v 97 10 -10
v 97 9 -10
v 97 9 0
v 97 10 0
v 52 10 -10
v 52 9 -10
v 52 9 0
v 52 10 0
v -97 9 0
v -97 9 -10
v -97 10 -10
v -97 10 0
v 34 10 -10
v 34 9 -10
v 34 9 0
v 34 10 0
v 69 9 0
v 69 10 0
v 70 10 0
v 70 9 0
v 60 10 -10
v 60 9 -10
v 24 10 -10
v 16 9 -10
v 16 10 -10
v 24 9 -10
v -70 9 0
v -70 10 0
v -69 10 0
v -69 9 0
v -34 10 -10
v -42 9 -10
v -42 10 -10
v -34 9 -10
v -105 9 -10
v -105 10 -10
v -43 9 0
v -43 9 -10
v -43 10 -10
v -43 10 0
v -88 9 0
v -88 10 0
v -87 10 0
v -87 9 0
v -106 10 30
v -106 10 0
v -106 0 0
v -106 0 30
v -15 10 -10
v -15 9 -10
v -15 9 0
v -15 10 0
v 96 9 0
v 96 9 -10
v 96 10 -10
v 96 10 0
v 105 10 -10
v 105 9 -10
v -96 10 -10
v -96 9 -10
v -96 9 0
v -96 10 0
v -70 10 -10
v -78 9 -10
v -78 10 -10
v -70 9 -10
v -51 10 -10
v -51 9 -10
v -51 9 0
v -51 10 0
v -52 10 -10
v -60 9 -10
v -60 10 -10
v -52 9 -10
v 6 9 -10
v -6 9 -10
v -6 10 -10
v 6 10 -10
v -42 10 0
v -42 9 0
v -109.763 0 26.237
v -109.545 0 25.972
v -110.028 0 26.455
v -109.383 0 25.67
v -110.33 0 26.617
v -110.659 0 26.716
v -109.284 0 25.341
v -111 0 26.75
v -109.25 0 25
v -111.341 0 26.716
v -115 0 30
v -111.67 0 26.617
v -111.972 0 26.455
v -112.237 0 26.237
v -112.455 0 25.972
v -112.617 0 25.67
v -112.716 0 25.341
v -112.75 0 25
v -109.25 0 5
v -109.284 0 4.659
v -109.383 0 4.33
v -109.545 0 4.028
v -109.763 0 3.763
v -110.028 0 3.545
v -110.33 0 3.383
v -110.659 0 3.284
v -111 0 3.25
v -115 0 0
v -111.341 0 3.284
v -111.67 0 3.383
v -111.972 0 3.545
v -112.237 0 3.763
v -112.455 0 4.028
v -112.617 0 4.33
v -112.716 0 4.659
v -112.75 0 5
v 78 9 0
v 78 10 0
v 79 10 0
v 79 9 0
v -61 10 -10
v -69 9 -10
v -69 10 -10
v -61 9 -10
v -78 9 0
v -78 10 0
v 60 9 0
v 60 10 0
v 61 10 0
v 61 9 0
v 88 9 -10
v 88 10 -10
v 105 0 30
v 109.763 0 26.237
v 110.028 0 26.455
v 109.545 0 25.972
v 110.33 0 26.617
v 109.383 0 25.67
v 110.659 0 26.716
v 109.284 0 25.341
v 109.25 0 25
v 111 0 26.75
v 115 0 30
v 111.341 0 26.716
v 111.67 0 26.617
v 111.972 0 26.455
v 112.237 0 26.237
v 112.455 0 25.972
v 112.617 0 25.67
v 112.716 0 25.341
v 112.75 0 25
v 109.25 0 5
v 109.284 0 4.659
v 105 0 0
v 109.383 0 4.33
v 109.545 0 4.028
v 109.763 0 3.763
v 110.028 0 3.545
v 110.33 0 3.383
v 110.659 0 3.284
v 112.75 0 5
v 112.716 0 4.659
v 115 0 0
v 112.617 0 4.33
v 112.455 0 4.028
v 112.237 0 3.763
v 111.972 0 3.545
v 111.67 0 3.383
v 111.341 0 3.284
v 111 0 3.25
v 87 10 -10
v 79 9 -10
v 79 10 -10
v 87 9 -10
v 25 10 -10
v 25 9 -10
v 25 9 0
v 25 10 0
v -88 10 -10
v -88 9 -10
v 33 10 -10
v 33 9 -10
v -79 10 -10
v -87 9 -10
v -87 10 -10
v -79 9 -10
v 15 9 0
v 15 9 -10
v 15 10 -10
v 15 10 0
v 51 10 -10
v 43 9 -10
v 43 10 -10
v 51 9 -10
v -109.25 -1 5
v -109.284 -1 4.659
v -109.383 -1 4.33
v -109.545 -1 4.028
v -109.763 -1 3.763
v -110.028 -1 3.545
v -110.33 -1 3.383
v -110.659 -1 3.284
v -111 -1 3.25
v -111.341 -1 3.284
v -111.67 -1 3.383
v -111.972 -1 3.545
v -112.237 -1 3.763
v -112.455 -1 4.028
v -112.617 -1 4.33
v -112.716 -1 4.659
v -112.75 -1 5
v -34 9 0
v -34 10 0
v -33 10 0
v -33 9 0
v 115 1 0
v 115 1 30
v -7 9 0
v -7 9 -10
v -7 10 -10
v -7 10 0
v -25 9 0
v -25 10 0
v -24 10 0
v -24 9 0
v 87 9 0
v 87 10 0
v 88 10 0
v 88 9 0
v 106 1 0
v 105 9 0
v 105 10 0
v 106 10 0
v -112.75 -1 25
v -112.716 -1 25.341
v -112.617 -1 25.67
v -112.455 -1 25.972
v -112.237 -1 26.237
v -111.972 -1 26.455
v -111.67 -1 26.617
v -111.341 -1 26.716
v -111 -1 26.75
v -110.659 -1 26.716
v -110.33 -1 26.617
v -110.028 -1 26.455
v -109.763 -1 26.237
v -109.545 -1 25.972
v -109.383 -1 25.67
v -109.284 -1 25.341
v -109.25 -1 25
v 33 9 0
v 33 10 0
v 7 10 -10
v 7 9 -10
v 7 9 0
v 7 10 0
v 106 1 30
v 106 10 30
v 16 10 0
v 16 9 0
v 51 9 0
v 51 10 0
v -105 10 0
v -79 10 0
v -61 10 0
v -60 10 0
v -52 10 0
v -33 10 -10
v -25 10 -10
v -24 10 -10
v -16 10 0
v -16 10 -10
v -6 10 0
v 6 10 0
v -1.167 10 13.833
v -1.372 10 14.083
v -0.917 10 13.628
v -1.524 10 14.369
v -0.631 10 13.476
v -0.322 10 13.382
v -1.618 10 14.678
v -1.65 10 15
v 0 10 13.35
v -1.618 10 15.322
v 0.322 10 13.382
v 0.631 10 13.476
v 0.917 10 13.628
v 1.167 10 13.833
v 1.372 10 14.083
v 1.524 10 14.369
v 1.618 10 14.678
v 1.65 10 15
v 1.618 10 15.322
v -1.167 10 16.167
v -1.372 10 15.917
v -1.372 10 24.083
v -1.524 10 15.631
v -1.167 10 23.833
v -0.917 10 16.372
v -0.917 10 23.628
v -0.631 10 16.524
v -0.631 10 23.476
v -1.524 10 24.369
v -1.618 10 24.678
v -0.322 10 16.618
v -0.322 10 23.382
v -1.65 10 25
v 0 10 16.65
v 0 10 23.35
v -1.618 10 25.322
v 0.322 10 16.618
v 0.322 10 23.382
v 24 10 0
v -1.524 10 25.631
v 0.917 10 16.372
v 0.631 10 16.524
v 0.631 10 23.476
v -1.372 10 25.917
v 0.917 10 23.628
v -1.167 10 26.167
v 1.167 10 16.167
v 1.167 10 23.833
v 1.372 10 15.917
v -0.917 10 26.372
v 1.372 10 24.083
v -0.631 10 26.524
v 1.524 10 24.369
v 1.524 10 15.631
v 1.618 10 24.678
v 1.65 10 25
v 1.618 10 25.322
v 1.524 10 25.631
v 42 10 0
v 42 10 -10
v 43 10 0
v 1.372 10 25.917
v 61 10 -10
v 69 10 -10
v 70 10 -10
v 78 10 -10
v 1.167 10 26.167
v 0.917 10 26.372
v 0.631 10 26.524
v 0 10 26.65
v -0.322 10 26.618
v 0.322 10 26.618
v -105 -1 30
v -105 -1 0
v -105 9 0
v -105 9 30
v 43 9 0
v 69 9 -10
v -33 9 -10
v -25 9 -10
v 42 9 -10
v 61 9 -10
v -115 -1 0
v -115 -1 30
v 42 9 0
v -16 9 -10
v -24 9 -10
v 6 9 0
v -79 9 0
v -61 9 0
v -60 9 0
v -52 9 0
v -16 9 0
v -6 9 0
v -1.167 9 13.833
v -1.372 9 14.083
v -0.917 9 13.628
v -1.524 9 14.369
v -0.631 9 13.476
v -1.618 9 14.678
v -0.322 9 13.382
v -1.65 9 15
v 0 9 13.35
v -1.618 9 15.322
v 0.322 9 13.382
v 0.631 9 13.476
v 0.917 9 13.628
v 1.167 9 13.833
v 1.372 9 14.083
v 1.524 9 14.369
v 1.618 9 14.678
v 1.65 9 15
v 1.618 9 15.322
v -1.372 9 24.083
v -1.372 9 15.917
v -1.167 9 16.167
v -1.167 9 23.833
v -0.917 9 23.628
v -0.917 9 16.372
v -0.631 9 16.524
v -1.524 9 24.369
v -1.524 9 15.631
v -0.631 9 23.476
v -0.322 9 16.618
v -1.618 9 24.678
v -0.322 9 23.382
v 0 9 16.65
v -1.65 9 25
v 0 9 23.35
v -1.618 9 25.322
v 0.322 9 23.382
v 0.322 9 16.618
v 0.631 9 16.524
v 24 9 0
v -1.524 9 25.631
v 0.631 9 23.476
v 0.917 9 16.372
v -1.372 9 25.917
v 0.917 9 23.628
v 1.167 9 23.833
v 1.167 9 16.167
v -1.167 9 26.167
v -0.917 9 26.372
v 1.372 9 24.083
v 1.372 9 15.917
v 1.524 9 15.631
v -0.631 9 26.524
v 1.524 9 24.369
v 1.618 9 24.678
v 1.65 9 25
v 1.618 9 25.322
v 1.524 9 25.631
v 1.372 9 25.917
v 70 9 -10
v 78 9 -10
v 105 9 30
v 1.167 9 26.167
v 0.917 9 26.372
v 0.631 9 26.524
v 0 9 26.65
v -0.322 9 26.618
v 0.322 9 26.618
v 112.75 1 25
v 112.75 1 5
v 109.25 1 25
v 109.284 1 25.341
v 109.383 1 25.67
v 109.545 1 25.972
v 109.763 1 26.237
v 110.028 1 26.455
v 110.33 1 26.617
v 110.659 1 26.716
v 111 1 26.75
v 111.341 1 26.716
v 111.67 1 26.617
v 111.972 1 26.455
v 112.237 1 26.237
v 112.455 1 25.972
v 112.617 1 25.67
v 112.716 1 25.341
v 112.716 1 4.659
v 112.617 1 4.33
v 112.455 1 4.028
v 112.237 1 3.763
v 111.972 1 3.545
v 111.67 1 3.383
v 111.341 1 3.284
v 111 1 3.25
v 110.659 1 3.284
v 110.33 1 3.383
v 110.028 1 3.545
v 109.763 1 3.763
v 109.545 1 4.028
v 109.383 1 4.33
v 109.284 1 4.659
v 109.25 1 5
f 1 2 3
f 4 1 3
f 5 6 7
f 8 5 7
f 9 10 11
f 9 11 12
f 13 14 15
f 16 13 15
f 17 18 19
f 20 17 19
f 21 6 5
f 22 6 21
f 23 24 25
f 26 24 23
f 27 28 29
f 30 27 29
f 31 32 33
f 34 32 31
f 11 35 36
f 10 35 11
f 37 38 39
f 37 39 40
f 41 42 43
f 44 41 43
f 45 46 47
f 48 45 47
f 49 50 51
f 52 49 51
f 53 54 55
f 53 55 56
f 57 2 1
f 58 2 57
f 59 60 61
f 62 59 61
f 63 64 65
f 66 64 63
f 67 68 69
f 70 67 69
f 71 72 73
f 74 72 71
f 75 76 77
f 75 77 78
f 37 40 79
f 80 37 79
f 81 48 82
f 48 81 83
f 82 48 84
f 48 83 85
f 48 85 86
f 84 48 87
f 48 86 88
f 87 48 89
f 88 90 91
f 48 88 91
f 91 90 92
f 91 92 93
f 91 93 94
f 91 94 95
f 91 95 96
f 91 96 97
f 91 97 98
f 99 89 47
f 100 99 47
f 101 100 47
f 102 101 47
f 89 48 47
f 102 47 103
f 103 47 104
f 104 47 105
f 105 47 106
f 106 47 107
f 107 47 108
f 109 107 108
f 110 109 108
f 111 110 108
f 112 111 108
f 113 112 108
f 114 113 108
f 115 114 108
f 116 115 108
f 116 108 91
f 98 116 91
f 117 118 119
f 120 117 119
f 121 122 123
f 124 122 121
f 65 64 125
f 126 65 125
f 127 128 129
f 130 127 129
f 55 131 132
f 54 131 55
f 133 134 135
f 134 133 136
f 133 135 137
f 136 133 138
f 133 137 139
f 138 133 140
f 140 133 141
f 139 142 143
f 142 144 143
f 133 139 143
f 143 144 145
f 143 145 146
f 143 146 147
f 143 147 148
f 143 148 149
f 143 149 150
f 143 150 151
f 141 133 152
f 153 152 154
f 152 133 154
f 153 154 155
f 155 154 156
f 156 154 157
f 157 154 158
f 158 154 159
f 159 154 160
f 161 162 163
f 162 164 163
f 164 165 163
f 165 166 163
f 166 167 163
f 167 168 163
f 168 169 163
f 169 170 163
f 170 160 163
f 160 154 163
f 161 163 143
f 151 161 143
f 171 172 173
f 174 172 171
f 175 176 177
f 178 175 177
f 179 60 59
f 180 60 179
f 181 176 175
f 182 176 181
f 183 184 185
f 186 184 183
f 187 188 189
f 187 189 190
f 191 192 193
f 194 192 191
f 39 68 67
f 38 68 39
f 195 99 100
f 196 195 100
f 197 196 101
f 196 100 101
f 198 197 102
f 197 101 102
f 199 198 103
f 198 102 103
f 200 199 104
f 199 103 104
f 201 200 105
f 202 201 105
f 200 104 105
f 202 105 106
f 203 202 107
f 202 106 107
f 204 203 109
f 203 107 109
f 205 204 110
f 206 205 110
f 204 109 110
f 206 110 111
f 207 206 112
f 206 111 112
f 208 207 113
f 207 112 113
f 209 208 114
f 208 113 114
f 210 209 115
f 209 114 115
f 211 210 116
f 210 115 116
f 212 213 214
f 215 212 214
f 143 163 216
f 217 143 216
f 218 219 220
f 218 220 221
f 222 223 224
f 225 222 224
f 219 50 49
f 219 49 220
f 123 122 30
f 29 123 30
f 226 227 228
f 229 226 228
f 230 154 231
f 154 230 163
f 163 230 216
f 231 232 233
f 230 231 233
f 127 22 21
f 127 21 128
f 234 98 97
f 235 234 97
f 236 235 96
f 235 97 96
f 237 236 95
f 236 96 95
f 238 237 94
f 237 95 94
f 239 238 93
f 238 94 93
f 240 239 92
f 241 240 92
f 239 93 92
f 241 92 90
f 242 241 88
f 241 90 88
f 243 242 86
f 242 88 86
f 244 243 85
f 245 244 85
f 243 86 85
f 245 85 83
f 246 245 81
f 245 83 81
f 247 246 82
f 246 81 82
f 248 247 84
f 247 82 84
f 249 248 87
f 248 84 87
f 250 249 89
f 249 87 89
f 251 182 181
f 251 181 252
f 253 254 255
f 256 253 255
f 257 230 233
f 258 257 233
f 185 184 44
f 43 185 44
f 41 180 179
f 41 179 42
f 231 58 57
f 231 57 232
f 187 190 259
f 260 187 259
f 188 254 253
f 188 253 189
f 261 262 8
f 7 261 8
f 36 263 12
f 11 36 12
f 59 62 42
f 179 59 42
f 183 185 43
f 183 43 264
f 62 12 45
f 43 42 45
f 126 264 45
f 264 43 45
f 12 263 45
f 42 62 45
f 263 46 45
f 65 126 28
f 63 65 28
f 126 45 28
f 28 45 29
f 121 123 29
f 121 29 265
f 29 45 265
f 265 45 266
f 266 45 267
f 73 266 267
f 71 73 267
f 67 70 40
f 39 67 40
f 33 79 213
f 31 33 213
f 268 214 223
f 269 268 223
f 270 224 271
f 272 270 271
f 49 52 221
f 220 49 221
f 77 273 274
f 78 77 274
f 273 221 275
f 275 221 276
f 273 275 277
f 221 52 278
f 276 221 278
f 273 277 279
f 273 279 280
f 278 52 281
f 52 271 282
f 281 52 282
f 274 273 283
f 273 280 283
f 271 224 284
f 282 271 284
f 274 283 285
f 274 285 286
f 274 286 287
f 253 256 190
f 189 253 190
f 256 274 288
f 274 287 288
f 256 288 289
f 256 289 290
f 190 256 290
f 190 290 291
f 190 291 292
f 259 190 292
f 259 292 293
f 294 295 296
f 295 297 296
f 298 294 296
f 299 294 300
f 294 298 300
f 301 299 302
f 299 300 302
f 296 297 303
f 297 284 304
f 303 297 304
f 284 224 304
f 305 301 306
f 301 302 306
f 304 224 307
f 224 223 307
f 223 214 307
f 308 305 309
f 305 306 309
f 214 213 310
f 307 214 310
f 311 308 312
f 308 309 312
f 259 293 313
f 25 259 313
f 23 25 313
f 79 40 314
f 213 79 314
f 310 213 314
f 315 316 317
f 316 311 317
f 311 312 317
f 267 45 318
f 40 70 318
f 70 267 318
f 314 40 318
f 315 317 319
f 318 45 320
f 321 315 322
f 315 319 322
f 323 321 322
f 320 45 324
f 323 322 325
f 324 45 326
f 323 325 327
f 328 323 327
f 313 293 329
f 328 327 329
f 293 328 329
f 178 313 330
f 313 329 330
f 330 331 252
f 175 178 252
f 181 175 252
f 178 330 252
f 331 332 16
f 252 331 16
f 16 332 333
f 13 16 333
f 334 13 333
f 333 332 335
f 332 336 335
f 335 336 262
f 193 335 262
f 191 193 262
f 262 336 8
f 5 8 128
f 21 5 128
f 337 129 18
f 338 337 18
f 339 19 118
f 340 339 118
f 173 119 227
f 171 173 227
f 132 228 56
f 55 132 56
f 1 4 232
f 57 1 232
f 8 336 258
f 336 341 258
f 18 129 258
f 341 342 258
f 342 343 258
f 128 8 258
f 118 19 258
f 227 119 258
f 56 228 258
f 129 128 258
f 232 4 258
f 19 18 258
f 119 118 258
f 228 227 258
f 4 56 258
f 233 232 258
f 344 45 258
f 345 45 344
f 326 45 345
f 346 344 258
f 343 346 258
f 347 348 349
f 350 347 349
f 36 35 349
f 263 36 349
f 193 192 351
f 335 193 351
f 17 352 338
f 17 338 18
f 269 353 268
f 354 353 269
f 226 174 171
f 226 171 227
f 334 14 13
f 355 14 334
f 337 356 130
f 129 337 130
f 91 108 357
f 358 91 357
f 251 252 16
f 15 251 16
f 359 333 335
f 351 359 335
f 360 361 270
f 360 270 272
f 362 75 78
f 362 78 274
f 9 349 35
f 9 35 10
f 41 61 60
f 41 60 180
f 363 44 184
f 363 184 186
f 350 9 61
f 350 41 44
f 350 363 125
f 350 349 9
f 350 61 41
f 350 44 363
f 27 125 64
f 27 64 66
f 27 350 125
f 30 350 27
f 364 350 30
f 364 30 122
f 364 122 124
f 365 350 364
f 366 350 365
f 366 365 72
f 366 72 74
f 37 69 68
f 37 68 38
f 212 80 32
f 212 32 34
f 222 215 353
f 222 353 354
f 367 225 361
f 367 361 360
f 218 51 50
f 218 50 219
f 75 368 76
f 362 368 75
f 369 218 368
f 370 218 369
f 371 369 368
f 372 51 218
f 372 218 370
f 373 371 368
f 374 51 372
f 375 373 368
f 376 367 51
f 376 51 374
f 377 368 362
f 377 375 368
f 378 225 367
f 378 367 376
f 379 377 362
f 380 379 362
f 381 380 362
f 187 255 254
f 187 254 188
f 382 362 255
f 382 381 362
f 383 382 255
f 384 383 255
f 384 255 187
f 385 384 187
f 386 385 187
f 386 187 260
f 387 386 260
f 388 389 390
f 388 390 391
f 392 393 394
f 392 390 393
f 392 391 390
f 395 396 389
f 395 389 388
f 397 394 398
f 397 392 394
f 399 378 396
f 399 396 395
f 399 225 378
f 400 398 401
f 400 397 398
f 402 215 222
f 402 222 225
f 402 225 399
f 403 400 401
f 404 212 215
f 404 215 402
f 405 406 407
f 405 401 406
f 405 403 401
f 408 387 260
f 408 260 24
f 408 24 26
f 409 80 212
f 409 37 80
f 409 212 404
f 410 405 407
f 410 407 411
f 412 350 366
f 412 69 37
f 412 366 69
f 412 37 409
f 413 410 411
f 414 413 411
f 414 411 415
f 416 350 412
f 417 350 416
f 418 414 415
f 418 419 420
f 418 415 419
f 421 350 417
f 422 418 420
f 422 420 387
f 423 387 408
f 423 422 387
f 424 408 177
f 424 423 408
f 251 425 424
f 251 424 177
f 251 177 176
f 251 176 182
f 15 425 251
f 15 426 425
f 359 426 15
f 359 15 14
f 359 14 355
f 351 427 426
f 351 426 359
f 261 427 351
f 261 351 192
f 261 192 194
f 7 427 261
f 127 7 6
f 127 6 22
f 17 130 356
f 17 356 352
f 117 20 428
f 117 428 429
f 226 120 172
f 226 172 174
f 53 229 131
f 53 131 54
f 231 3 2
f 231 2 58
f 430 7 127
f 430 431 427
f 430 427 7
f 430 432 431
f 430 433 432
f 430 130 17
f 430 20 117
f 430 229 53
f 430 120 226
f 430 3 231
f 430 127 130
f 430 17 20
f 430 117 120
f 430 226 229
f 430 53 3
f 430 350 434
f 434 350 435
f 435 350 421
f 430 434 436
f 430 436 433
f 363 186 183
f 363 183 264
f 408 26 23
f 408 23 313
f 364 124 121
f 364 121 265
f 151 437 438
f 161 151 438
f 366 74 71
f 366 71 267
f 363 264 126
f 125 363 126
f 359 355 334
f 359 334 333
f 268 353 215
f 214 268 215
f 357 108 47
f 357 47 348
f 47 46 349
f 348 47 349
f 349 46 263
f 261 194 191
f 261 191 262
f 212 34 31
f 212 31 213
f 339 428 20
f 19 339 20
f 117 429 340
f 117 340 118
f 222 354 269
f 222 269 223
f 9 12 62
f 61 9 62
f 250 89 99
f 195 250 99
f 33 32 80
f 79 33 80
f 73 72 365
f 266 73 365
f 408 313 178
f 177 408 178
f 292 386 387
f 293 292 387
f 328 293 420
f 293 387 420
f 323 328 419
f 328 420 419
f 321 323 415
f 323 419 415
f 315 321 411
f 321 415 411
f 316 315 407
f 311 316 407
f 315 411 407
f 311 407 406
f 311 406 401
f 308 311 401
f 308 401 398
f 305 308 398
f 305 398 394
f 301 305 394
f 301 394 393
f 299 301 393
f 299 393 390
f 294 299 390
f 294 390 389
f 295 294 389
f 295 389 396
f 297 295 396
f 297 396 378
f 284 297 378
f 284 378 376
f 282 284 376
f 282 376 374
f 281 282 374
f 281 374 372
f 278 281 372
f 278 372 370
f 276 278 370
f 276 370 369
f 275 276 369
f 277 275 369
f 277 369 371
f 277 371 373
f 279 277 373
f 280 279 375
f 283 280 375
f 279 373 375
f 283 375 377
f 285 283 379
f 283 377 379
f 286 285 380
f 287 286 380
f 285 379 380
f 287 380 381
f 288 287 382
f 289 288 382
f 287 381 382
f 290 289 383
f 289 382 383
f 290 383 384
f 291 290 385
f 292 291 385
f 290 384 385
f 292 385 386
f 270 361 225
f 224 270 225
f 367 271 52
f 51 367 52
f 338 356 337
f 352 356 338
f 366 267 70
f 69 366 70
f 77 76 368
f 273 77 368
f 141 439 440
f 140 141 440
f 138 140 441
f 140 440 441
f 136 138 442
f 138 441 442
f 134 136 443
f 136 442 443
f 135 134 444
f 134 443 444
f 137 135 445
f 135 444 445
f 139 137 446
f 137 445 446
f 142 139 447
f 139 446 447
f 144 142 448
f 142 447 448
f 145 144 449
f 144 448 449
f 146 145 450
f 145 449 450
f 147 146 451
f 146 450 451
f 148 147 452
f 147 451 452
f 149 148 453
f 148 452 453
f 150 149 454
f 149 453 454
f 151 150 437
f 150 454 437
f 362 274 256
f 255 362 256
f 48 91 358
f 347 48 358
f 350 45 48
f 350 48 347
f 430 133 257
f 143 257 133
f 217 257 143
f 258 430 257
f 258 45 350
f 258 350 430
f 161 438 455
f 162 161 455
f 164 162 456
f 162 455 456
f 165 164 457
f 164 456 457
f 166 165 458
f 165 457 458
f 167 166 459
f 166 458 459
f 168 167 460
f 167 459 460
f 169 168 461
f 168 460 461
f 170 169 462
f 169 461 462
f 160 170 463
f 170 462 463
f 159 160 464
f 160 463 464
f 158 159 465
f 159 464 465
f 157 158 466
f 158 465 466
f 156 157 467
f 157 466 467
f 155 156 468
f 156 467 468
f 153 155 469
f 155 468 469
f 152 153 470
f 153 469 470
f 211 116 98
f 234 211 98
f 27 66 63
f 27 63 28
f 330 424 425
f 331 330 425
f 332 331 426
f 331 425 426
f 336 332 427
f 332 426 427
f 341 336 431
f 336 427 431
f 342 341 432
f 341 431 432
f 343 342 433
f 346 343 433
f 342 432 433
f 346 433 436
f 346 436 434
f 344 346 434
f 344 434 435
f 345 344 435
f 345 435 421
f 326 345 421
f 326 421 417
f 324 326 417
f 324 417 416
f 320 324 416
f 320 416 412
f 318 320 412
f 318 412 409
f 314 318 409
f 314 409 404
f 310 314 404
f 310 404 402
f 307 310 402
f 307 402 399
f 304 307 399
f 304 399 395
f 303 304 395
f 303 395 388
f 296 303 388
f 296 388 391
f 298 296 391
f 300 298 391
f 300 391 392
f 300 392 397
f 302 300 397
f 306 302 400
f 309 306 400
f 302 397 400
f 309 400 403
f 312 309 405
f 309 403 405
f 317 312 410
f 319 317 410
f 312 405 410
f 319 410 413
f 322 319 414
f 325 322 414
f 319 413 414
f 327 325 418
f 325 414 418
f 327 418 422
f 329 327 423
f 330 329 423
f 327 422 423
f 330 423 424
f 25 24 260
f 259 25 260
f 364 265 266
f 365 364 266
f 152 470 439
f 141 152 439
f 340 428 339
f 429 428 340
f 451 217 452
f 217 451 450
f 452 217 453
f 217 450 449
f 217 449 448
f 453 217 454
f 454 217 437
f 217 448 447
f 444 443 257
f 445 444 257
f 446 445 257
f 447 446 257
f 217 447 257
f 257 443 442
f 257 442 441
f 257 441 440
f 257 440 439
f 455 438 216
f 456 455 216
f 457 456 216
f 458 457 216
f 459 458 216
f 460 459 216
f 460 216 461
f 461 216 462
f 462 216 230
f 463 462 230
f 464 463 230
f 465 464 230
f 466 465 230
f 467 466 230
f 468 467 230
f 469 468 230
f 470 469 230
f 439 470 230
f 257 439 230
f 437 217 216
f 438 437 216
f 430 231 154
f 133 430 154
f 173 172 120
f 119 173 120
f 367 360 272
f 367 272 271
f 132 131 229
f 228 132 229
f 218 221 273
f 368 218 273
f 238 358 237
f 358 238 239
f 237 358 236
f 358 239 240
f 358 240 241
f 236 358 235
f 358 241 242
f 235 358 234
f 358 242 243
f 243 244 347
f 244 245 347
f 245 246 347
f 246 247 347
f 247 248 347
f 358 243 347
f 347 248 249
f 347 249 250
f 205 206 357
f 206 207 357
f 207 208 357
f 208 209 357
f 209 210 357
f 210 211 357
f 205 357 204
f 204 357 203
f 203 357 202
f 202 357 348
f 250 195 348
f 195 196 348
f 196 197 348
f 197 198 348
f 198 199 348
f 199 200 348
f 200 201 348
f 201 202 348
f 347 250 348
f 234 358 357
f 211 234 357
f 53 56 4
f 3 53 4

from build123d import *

# Parameters (mm, degrees)
F1_DEPTH = 30
F3_DEPTH = 25
F4_W     = 8
F4_H     = 10
F4_W_2   = 12
F5_DEPTH = 1
F7_D     = 3.3


with BuildPart() as f1:
    # F0 (on Top) → F1 (new body)
    with BuildSketch(Plane.XY):
        Polygon((-115, 0), (-115, -1), (-105, -1), (-105, 9), (105, 9), (105, 0), (115, 0), (115, 1), (106, 1), (106, 10), (-106, 10), (-106, 0), align=None)
    extrude(amount=F1_DEPTH)

    # F2 (on face) → F3 (cut)
    with BuildSketch(Plane(origin=(0, 1, 0), x_dir=(-1, 0, 0), z_dir=(0, 1, 0))):
        with BuildLine():
            Line((-109.25, 5), (-109.25, 25))
            ThreePointArc((-109.25, 25), (-111, 26.75), (-112.75, 25))
            Line((-112.75, 25), (-112.75, 5))
            ThreePointArc((-112.75, 5), (-111, 3.25), (-109.25, 5))
        make_face()
        with BuildLine():
            Line((109.25, 25), (109.25, 5))
            ThreePointArc((109.25, 5), (111, 3.25), (112.75, 5))
            Line((112.75, 5), (112.75, 25))
            ThreePointArc((112.75, 25), (111, 26.75), (109.25, 25))
        make_face()
    extrude(amount=-F3_DEPTH, mode=Mode.SUBTRACT)

    # F4 (on face) → F5 (join)
    with BuildSketch(Plane.XZ.offset(-9)):
        with Locations((-101, -5)):
            Rectangle(F4_W, F4_H)
        with Locations((-92, -5)):
            Rectangle(F4_W, F4_H)
        with Locations((-83, -5)):
            Rectangle(F4_W, F4_H)
        with Locations((-74, -5)):
            Rectangle(F4_W, F4_H)
        with Locations((-65, -5)):
            Rectangle(F4_W, F4_H)
        with Locations((-56, -5)):
            Rectangle(F4_W, F4_H)
        with Locations((-47, -5)):
            Rectangle(F4_W, F4_H)
        with Locations((-38, -5)):
            Rectangle(F4_W, F4_H)
        with Locations((-29, -5)):
            Rectangle(F4_W, F4_H)
        with Locations((-20, -5)):
            Rectangle(F4_W, F4_H)
        with Locations((-11, -5)):
            Rectangle(F4_W, F4_H)
        with Locations((101, -5)):
            Rectangle(F4_W, F4_H)
        with Locations((92, -5)):
            Rectangle(F4_W, F4_H)
        with Locations((83, -5)):
            Rectangle(F4_W, F4_H)
        with Locations((74, -5)):
            Rectangle(F4_W, F4_H)
        with Locations((65, -5)):
            Rectangle(F4_W, F4_H)
        with Locations((56, -5)):
            Rectangle(F4_W, F4_H)
        with Locations((47, -5)):
            Rectangle(F4_W, F4_H)
        with Locations((38, -5)):
            Rectangle(F4_W, F4_H)
        with Locations((29, -5)):
            Rectangle(F4_W, F4_H)
        with Locations((20, -5)):
            Rectangle(F4_W, F4_H)
        with Locations((11, -5)):
            Rectangle(F4_W, F4_H)
        with Locations((0, -5)):
            Rectangle(F4_W_2, F4_H)
    extrude(amount=-F5_DEPTH)

    # F7 (through all)
    with Locations(Plane(origin=(0, 10, 0), x_dir=(-1, 0, 0), z_dir=(0, 1, 0))):
        with Locations((0, 15), (0, 25)):
            Hole(F7_D / 2)


solid = f1.part
